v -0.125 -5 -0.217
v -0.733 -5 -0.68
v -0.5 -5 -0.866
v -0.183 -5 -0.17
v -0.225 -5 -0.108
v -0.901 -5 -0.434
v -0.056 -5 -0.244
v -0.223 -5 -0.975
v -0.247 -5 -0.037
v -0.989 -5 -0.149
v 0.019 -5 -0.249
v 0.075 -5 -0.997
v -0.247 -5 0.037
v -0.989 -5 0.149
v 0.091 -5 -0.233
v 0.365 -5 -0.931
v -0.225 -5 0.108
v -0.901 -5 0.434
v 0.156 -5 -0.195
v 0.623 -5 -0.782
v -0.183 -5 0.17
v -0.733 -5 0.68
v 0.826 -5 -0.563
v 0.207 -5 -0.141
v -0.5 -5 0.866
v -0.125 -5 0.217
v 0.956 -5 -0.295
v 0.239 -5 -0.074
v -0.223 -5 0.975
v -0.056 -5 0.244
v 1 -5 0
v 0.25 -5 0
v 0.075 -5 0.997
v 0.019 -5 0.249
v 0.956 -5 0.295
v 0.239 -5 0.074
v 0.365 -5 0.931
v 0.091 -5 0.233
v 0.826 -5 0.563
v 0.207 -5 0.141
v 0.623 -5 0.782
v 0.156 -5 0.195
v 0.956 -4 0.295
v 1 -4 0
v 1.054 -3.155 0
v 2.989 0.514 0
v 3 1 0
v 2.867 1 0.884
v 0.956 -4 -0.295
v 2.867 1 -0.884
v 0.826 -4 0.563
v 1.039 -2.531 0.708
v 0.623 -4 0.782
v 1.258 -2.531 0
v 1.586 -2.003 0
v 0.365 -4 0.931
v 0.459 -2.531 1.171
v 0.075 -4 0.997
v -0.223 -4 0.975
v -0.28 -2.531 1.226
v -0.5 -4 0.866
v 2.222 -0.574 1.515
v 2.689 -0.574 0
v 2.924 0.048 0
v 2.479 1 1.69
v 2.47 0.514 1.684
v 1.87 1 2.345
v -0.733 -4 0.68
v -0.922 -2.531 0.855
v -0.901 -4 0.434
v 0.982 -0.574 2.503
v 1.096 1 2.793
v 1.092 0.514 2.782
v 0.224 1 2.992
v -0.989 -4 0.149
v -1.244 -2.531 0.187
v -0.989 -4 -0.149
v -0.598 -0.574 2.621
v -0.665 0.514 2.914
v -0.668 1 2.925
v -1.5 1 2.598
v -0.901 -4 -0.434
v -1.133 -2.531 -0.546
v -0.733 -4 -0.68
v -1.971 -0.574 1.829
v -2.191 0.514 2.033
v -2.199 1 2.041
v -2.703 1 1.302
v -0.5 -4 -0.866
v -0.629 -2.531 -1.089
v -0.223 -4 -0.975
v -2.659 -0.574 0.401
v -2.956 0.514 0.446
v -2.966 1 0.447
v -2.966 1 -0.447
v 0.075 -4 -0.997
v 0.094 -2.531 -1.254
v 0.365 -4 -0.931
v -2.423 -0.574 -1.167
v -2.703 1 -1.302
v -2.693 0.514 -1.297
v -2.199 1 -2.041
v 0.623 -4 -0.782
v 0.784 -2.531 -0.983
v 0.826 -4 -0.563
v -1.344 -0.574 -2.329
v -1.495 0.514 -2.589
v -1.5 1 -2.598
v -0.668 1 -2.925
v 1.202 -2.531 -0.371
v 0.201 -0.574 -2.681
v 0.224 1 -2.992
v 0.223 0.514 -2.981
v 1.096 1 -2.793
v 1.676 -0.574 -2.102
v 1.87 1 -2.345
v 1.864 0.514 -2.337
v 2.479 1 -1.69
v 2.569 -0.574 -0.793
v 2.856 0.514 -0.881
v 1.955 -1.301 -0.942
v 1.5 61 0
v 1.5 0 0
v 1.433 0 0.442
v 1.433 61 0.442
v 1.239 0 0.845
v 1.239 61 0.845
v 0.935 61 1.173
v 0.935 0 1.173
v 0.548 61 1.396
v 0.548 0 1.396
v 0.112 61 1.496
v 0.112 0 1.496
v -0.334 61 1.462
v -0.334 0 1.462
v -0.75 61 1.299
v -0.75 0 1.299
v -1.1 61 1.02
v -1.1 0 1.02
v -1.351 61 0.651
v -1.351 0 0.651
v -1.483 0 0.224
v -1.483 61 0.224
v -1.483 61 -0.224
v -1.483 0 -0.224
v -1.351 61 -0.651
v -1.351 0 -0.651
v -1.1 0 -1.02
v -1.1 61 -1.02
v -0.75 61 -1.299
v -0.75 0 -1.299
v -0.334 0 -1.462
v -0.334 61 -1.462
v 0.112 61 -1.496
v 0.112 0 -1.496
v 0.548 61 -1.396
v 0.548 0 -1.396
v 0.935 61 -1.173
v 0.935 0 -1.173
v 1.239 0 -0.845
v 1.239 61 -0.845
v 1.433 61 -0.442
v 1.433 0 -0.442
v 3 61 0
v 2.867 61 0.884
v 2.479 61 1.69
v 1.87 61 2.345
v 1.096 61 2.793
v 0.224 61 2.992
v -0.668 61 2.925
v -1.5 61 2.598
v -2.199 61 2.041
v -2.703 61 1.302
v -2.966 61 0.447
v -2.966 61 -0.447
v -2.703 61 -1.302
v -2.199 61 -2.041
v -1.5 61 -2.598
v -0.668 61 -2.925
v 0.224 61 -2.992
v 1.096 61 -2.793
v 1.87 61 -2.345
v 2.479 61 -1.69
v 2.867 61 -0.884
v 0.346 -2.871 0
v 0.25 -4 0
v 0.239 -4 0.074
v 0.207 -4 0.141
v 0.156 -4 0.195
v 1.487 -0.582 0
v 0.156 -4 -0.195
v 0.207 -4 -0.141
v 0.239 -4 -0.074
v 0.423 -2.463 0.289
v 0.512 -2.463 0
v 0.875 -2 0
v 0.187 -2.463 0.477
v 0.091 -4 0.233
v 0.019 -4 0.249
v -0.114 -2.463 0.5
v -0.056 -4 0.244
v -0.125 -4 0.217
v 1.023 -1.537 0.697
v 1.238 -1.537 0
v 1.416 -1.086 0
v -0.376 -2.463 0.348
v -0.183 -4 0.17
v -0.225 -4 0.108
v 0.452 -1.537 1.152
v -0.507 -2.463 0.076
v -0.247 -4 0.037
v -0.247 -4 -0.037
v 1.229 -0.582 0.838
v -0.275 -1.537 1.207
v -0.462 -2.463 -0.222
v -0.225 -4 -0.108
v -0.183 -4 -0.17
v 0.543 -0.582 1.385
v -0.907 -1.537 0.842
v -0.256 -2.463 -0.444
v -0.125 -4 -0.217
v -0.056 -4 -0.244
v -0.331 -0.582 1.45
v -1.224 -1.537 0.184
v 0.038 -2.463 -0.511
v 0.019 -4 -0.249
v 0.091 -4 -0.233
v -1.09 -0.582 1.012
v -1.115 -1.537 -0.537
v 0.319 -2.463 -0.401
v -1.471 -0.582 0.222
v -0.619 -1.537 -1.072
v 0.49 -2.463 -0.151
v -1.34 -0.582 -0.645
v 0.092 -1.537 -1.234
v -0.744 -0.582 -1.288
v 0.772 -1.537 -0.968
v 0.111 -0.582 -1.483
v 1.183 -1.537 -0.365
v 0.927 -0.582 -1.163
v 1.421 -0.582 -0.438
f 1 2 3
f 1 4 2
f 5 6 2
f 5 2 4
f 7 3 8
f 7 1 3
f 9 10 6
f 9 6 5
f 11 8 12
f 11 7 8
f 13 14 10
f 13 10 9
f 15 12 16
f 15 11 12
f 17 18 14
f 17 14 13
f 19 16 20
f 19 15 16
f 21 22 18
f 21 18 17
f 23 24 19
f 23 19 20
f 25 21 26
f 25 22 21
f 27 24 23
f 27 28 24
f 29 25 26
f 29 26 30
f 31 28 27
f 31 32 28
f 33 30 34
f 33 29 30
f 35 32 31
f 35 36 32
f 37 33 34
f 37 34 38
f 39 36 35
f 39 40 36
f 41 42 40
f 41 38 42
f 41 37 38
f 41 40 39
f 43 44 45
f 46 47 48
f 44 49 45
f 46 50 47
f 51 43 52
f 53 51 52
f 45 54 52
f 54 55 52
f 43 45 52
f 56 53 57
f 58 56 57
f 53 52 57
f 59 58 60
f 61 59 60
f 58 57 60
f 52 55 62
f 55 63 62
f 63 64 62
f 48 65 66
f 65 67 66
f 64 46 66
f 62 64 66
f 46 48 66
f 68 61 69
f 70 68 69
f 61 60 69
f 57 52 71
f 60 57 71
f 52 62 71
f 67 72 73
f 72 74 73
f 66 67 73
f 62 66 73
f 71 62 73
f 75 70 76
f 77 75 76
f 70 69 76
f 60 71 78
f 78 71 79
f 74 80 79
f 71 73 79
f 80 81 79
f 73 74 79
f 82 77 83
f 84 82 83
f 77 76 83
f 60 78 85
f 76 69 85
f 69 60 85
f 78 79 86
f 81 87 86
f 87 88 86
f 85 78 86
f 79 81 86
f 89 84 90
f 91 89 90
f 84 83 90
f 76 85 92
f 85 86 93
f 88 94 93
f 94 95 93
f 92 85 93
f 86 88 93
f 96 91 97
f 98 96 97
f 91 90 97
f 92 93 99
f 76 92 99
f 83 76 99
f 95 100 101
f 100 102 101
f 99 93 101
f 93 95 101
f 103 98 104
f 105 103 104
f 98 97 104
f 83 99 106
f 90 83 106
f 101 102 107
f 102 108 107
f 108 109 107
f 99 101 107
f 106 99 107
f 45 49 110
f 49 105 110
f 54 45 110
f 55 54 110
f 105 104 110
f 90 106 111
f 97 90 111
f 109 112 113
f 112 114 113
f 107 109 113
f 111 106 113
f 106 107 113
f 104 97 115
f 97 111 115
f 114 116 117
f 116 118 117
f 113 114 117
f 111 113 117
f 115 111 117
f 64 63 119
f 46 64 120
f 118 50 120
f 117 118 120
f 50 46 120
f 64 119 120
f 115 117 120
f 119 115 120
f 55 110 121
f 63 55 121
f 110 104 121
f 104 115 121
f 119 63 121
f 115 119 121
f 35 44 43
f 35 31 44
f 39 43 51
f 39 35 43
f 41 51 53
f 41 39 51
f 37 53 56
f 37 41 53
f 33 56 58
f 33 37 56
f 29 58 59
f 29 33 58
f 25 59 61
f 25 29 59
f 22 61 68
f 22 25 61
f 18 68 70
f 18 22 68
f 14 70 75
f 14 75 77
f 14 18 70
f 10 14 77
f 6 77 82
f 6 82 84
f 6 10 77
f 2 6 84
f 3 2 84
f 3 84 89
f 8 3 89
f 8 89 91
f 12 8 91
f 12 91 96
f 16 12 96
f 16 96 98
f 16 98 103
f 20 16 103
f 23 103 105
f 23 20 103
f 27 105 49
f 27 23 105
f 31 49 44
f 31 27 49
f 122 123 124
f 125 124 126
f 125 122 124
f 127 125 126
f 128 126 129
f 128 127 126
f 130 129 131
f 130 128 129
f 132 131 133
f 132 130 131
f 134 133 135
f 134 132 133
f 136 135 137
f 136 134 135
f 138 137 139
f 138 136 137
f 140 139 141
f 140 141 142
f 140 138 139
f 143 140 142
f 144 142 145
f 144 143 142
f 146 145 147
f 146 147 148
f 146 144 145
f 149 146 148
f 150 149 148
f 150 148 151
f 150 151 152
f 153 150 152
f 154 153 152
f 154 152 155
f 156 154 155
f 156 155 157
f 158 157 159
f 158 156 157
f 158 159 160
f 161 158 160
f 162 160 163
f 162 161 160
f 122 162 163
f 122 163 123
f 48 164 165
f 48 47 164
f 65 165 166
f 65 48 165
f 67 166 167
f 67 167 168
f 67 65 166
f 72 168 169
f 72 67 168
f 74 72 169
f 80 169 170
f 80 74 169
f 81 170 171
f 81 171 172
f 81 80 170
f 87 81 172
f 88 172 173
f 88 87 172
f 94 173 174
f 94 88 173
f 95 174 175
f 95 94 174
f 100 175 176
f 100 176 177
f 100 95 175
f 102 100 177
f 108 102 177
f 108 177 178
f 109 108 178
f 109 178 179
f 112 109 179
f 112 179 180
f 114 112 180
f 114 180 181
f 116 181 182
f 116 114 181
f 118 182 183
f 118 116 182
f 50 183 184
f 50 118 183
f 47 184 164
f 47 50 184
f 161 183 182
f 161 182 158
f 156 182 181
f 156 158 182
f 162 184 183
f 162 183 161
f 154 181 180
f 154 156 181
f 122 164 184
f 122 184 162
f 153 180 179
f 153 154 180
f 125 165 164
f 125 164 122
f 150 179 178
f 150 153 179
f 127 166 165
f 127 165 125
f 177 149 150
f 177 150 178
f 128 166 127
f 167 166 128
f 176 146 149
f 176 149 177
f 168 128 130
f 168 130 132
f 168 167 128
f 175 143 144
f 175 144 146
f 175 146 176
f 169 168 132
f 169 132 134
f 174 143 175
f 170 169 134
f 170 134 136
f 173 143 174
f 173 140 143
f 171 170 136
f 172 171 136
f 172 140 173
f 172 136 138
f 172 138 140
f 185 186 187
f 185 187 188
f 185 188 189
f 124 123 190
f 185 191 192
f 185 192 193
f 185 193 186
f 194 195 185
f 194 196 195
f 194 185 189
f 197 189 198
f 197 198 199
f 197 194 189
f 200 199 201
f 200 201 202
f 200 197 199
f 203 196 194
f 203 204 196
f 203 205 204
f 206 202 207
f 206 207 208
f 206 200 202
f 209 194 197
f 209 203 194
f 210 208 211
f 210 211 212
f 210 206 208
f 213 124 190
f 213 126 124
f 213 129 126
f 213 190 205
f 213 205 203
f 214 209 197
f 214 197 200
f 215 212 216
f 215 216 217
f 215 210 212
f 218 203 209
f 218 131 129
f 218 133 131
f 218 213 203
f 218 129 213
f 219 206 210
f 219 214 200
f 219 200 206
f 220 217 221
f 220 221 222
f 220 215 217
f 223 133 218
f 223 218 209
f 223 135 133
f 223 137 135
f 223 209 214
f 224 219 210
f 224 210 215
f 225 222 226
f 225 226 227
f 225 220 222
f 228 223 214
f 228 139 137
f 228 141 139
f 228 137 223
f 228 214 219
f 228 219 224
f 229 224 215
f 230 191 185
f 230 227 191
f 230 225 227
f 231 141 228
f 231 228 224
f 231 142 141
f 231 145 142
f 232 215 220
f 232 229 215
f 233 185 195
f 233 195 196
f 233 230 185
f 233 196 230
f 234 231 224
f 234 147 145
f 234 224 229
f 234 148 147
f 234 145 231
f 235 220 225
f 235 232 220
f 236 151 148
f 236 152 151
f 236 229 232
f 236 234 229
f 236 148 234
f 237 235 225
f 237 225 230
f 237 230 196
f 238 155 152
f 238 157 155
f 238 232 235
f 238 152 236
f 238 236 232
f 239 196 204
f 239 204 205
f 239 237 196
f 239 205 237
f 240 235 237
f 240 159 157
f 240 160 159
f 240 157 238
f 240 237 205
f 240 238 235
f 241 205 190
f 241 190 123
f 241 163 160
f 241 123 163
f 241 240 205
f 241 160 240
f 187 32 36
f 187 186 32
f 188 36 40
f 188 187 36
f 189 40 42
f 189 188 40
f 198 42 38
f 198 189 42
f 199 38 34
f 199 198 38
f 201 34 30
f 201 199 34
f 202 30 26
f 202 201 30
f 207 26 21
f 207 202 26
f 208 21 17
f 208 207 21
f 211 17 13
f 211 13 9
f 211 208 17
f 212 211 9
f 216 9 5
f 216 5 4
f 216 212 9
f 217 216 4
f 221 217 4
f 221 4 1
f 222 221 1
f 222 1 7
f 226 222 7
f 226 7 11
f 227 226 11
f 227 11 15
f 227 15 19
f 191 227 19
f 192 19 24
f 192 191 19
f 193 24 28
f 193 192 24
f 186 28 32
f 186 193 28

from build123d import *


with BuildPart() as part:
    # Sketch1 → Revolve1 (revolve)
    with BuildSketch(Plane.XY):
        with BuildLine():
            Line((1.5, 61), (3, 61))
            Line((3, 61), (3, 1))
            add(Edge.make_bspline(
                [(1, -4), (1, -2.852326224), (1, -1.704652447), (3, -1.295347553), (3, -0.147673776), (3, 1)],
                knots=[0, 0, 0, 0, 0, 0, 1, 1, 1, 1, 1, 1], degree=5))
            Line((1, -4), (1, -5))
            Line((1, -5), (0.25, -5))
            Line((0.25, -5), (0.25, -4))
            add(Edge.make_bspline(
                [(0.25, -4), (0.25, -2.870146948), (0.25, -1.740293897), (1.5, -2.259706103), (1.5, -1.129853052), (1.5, 0)],
                knots=[0, 0, 0, 0, 0, 0, 1, 1, 1, 1, 1, 1], degree=5))
            Line((1.5, 0), (1.5, 61))
        make_face()
    revolve(axis=Axis((0, 0, 0), (0, -1, 0)))


solid = part.part
